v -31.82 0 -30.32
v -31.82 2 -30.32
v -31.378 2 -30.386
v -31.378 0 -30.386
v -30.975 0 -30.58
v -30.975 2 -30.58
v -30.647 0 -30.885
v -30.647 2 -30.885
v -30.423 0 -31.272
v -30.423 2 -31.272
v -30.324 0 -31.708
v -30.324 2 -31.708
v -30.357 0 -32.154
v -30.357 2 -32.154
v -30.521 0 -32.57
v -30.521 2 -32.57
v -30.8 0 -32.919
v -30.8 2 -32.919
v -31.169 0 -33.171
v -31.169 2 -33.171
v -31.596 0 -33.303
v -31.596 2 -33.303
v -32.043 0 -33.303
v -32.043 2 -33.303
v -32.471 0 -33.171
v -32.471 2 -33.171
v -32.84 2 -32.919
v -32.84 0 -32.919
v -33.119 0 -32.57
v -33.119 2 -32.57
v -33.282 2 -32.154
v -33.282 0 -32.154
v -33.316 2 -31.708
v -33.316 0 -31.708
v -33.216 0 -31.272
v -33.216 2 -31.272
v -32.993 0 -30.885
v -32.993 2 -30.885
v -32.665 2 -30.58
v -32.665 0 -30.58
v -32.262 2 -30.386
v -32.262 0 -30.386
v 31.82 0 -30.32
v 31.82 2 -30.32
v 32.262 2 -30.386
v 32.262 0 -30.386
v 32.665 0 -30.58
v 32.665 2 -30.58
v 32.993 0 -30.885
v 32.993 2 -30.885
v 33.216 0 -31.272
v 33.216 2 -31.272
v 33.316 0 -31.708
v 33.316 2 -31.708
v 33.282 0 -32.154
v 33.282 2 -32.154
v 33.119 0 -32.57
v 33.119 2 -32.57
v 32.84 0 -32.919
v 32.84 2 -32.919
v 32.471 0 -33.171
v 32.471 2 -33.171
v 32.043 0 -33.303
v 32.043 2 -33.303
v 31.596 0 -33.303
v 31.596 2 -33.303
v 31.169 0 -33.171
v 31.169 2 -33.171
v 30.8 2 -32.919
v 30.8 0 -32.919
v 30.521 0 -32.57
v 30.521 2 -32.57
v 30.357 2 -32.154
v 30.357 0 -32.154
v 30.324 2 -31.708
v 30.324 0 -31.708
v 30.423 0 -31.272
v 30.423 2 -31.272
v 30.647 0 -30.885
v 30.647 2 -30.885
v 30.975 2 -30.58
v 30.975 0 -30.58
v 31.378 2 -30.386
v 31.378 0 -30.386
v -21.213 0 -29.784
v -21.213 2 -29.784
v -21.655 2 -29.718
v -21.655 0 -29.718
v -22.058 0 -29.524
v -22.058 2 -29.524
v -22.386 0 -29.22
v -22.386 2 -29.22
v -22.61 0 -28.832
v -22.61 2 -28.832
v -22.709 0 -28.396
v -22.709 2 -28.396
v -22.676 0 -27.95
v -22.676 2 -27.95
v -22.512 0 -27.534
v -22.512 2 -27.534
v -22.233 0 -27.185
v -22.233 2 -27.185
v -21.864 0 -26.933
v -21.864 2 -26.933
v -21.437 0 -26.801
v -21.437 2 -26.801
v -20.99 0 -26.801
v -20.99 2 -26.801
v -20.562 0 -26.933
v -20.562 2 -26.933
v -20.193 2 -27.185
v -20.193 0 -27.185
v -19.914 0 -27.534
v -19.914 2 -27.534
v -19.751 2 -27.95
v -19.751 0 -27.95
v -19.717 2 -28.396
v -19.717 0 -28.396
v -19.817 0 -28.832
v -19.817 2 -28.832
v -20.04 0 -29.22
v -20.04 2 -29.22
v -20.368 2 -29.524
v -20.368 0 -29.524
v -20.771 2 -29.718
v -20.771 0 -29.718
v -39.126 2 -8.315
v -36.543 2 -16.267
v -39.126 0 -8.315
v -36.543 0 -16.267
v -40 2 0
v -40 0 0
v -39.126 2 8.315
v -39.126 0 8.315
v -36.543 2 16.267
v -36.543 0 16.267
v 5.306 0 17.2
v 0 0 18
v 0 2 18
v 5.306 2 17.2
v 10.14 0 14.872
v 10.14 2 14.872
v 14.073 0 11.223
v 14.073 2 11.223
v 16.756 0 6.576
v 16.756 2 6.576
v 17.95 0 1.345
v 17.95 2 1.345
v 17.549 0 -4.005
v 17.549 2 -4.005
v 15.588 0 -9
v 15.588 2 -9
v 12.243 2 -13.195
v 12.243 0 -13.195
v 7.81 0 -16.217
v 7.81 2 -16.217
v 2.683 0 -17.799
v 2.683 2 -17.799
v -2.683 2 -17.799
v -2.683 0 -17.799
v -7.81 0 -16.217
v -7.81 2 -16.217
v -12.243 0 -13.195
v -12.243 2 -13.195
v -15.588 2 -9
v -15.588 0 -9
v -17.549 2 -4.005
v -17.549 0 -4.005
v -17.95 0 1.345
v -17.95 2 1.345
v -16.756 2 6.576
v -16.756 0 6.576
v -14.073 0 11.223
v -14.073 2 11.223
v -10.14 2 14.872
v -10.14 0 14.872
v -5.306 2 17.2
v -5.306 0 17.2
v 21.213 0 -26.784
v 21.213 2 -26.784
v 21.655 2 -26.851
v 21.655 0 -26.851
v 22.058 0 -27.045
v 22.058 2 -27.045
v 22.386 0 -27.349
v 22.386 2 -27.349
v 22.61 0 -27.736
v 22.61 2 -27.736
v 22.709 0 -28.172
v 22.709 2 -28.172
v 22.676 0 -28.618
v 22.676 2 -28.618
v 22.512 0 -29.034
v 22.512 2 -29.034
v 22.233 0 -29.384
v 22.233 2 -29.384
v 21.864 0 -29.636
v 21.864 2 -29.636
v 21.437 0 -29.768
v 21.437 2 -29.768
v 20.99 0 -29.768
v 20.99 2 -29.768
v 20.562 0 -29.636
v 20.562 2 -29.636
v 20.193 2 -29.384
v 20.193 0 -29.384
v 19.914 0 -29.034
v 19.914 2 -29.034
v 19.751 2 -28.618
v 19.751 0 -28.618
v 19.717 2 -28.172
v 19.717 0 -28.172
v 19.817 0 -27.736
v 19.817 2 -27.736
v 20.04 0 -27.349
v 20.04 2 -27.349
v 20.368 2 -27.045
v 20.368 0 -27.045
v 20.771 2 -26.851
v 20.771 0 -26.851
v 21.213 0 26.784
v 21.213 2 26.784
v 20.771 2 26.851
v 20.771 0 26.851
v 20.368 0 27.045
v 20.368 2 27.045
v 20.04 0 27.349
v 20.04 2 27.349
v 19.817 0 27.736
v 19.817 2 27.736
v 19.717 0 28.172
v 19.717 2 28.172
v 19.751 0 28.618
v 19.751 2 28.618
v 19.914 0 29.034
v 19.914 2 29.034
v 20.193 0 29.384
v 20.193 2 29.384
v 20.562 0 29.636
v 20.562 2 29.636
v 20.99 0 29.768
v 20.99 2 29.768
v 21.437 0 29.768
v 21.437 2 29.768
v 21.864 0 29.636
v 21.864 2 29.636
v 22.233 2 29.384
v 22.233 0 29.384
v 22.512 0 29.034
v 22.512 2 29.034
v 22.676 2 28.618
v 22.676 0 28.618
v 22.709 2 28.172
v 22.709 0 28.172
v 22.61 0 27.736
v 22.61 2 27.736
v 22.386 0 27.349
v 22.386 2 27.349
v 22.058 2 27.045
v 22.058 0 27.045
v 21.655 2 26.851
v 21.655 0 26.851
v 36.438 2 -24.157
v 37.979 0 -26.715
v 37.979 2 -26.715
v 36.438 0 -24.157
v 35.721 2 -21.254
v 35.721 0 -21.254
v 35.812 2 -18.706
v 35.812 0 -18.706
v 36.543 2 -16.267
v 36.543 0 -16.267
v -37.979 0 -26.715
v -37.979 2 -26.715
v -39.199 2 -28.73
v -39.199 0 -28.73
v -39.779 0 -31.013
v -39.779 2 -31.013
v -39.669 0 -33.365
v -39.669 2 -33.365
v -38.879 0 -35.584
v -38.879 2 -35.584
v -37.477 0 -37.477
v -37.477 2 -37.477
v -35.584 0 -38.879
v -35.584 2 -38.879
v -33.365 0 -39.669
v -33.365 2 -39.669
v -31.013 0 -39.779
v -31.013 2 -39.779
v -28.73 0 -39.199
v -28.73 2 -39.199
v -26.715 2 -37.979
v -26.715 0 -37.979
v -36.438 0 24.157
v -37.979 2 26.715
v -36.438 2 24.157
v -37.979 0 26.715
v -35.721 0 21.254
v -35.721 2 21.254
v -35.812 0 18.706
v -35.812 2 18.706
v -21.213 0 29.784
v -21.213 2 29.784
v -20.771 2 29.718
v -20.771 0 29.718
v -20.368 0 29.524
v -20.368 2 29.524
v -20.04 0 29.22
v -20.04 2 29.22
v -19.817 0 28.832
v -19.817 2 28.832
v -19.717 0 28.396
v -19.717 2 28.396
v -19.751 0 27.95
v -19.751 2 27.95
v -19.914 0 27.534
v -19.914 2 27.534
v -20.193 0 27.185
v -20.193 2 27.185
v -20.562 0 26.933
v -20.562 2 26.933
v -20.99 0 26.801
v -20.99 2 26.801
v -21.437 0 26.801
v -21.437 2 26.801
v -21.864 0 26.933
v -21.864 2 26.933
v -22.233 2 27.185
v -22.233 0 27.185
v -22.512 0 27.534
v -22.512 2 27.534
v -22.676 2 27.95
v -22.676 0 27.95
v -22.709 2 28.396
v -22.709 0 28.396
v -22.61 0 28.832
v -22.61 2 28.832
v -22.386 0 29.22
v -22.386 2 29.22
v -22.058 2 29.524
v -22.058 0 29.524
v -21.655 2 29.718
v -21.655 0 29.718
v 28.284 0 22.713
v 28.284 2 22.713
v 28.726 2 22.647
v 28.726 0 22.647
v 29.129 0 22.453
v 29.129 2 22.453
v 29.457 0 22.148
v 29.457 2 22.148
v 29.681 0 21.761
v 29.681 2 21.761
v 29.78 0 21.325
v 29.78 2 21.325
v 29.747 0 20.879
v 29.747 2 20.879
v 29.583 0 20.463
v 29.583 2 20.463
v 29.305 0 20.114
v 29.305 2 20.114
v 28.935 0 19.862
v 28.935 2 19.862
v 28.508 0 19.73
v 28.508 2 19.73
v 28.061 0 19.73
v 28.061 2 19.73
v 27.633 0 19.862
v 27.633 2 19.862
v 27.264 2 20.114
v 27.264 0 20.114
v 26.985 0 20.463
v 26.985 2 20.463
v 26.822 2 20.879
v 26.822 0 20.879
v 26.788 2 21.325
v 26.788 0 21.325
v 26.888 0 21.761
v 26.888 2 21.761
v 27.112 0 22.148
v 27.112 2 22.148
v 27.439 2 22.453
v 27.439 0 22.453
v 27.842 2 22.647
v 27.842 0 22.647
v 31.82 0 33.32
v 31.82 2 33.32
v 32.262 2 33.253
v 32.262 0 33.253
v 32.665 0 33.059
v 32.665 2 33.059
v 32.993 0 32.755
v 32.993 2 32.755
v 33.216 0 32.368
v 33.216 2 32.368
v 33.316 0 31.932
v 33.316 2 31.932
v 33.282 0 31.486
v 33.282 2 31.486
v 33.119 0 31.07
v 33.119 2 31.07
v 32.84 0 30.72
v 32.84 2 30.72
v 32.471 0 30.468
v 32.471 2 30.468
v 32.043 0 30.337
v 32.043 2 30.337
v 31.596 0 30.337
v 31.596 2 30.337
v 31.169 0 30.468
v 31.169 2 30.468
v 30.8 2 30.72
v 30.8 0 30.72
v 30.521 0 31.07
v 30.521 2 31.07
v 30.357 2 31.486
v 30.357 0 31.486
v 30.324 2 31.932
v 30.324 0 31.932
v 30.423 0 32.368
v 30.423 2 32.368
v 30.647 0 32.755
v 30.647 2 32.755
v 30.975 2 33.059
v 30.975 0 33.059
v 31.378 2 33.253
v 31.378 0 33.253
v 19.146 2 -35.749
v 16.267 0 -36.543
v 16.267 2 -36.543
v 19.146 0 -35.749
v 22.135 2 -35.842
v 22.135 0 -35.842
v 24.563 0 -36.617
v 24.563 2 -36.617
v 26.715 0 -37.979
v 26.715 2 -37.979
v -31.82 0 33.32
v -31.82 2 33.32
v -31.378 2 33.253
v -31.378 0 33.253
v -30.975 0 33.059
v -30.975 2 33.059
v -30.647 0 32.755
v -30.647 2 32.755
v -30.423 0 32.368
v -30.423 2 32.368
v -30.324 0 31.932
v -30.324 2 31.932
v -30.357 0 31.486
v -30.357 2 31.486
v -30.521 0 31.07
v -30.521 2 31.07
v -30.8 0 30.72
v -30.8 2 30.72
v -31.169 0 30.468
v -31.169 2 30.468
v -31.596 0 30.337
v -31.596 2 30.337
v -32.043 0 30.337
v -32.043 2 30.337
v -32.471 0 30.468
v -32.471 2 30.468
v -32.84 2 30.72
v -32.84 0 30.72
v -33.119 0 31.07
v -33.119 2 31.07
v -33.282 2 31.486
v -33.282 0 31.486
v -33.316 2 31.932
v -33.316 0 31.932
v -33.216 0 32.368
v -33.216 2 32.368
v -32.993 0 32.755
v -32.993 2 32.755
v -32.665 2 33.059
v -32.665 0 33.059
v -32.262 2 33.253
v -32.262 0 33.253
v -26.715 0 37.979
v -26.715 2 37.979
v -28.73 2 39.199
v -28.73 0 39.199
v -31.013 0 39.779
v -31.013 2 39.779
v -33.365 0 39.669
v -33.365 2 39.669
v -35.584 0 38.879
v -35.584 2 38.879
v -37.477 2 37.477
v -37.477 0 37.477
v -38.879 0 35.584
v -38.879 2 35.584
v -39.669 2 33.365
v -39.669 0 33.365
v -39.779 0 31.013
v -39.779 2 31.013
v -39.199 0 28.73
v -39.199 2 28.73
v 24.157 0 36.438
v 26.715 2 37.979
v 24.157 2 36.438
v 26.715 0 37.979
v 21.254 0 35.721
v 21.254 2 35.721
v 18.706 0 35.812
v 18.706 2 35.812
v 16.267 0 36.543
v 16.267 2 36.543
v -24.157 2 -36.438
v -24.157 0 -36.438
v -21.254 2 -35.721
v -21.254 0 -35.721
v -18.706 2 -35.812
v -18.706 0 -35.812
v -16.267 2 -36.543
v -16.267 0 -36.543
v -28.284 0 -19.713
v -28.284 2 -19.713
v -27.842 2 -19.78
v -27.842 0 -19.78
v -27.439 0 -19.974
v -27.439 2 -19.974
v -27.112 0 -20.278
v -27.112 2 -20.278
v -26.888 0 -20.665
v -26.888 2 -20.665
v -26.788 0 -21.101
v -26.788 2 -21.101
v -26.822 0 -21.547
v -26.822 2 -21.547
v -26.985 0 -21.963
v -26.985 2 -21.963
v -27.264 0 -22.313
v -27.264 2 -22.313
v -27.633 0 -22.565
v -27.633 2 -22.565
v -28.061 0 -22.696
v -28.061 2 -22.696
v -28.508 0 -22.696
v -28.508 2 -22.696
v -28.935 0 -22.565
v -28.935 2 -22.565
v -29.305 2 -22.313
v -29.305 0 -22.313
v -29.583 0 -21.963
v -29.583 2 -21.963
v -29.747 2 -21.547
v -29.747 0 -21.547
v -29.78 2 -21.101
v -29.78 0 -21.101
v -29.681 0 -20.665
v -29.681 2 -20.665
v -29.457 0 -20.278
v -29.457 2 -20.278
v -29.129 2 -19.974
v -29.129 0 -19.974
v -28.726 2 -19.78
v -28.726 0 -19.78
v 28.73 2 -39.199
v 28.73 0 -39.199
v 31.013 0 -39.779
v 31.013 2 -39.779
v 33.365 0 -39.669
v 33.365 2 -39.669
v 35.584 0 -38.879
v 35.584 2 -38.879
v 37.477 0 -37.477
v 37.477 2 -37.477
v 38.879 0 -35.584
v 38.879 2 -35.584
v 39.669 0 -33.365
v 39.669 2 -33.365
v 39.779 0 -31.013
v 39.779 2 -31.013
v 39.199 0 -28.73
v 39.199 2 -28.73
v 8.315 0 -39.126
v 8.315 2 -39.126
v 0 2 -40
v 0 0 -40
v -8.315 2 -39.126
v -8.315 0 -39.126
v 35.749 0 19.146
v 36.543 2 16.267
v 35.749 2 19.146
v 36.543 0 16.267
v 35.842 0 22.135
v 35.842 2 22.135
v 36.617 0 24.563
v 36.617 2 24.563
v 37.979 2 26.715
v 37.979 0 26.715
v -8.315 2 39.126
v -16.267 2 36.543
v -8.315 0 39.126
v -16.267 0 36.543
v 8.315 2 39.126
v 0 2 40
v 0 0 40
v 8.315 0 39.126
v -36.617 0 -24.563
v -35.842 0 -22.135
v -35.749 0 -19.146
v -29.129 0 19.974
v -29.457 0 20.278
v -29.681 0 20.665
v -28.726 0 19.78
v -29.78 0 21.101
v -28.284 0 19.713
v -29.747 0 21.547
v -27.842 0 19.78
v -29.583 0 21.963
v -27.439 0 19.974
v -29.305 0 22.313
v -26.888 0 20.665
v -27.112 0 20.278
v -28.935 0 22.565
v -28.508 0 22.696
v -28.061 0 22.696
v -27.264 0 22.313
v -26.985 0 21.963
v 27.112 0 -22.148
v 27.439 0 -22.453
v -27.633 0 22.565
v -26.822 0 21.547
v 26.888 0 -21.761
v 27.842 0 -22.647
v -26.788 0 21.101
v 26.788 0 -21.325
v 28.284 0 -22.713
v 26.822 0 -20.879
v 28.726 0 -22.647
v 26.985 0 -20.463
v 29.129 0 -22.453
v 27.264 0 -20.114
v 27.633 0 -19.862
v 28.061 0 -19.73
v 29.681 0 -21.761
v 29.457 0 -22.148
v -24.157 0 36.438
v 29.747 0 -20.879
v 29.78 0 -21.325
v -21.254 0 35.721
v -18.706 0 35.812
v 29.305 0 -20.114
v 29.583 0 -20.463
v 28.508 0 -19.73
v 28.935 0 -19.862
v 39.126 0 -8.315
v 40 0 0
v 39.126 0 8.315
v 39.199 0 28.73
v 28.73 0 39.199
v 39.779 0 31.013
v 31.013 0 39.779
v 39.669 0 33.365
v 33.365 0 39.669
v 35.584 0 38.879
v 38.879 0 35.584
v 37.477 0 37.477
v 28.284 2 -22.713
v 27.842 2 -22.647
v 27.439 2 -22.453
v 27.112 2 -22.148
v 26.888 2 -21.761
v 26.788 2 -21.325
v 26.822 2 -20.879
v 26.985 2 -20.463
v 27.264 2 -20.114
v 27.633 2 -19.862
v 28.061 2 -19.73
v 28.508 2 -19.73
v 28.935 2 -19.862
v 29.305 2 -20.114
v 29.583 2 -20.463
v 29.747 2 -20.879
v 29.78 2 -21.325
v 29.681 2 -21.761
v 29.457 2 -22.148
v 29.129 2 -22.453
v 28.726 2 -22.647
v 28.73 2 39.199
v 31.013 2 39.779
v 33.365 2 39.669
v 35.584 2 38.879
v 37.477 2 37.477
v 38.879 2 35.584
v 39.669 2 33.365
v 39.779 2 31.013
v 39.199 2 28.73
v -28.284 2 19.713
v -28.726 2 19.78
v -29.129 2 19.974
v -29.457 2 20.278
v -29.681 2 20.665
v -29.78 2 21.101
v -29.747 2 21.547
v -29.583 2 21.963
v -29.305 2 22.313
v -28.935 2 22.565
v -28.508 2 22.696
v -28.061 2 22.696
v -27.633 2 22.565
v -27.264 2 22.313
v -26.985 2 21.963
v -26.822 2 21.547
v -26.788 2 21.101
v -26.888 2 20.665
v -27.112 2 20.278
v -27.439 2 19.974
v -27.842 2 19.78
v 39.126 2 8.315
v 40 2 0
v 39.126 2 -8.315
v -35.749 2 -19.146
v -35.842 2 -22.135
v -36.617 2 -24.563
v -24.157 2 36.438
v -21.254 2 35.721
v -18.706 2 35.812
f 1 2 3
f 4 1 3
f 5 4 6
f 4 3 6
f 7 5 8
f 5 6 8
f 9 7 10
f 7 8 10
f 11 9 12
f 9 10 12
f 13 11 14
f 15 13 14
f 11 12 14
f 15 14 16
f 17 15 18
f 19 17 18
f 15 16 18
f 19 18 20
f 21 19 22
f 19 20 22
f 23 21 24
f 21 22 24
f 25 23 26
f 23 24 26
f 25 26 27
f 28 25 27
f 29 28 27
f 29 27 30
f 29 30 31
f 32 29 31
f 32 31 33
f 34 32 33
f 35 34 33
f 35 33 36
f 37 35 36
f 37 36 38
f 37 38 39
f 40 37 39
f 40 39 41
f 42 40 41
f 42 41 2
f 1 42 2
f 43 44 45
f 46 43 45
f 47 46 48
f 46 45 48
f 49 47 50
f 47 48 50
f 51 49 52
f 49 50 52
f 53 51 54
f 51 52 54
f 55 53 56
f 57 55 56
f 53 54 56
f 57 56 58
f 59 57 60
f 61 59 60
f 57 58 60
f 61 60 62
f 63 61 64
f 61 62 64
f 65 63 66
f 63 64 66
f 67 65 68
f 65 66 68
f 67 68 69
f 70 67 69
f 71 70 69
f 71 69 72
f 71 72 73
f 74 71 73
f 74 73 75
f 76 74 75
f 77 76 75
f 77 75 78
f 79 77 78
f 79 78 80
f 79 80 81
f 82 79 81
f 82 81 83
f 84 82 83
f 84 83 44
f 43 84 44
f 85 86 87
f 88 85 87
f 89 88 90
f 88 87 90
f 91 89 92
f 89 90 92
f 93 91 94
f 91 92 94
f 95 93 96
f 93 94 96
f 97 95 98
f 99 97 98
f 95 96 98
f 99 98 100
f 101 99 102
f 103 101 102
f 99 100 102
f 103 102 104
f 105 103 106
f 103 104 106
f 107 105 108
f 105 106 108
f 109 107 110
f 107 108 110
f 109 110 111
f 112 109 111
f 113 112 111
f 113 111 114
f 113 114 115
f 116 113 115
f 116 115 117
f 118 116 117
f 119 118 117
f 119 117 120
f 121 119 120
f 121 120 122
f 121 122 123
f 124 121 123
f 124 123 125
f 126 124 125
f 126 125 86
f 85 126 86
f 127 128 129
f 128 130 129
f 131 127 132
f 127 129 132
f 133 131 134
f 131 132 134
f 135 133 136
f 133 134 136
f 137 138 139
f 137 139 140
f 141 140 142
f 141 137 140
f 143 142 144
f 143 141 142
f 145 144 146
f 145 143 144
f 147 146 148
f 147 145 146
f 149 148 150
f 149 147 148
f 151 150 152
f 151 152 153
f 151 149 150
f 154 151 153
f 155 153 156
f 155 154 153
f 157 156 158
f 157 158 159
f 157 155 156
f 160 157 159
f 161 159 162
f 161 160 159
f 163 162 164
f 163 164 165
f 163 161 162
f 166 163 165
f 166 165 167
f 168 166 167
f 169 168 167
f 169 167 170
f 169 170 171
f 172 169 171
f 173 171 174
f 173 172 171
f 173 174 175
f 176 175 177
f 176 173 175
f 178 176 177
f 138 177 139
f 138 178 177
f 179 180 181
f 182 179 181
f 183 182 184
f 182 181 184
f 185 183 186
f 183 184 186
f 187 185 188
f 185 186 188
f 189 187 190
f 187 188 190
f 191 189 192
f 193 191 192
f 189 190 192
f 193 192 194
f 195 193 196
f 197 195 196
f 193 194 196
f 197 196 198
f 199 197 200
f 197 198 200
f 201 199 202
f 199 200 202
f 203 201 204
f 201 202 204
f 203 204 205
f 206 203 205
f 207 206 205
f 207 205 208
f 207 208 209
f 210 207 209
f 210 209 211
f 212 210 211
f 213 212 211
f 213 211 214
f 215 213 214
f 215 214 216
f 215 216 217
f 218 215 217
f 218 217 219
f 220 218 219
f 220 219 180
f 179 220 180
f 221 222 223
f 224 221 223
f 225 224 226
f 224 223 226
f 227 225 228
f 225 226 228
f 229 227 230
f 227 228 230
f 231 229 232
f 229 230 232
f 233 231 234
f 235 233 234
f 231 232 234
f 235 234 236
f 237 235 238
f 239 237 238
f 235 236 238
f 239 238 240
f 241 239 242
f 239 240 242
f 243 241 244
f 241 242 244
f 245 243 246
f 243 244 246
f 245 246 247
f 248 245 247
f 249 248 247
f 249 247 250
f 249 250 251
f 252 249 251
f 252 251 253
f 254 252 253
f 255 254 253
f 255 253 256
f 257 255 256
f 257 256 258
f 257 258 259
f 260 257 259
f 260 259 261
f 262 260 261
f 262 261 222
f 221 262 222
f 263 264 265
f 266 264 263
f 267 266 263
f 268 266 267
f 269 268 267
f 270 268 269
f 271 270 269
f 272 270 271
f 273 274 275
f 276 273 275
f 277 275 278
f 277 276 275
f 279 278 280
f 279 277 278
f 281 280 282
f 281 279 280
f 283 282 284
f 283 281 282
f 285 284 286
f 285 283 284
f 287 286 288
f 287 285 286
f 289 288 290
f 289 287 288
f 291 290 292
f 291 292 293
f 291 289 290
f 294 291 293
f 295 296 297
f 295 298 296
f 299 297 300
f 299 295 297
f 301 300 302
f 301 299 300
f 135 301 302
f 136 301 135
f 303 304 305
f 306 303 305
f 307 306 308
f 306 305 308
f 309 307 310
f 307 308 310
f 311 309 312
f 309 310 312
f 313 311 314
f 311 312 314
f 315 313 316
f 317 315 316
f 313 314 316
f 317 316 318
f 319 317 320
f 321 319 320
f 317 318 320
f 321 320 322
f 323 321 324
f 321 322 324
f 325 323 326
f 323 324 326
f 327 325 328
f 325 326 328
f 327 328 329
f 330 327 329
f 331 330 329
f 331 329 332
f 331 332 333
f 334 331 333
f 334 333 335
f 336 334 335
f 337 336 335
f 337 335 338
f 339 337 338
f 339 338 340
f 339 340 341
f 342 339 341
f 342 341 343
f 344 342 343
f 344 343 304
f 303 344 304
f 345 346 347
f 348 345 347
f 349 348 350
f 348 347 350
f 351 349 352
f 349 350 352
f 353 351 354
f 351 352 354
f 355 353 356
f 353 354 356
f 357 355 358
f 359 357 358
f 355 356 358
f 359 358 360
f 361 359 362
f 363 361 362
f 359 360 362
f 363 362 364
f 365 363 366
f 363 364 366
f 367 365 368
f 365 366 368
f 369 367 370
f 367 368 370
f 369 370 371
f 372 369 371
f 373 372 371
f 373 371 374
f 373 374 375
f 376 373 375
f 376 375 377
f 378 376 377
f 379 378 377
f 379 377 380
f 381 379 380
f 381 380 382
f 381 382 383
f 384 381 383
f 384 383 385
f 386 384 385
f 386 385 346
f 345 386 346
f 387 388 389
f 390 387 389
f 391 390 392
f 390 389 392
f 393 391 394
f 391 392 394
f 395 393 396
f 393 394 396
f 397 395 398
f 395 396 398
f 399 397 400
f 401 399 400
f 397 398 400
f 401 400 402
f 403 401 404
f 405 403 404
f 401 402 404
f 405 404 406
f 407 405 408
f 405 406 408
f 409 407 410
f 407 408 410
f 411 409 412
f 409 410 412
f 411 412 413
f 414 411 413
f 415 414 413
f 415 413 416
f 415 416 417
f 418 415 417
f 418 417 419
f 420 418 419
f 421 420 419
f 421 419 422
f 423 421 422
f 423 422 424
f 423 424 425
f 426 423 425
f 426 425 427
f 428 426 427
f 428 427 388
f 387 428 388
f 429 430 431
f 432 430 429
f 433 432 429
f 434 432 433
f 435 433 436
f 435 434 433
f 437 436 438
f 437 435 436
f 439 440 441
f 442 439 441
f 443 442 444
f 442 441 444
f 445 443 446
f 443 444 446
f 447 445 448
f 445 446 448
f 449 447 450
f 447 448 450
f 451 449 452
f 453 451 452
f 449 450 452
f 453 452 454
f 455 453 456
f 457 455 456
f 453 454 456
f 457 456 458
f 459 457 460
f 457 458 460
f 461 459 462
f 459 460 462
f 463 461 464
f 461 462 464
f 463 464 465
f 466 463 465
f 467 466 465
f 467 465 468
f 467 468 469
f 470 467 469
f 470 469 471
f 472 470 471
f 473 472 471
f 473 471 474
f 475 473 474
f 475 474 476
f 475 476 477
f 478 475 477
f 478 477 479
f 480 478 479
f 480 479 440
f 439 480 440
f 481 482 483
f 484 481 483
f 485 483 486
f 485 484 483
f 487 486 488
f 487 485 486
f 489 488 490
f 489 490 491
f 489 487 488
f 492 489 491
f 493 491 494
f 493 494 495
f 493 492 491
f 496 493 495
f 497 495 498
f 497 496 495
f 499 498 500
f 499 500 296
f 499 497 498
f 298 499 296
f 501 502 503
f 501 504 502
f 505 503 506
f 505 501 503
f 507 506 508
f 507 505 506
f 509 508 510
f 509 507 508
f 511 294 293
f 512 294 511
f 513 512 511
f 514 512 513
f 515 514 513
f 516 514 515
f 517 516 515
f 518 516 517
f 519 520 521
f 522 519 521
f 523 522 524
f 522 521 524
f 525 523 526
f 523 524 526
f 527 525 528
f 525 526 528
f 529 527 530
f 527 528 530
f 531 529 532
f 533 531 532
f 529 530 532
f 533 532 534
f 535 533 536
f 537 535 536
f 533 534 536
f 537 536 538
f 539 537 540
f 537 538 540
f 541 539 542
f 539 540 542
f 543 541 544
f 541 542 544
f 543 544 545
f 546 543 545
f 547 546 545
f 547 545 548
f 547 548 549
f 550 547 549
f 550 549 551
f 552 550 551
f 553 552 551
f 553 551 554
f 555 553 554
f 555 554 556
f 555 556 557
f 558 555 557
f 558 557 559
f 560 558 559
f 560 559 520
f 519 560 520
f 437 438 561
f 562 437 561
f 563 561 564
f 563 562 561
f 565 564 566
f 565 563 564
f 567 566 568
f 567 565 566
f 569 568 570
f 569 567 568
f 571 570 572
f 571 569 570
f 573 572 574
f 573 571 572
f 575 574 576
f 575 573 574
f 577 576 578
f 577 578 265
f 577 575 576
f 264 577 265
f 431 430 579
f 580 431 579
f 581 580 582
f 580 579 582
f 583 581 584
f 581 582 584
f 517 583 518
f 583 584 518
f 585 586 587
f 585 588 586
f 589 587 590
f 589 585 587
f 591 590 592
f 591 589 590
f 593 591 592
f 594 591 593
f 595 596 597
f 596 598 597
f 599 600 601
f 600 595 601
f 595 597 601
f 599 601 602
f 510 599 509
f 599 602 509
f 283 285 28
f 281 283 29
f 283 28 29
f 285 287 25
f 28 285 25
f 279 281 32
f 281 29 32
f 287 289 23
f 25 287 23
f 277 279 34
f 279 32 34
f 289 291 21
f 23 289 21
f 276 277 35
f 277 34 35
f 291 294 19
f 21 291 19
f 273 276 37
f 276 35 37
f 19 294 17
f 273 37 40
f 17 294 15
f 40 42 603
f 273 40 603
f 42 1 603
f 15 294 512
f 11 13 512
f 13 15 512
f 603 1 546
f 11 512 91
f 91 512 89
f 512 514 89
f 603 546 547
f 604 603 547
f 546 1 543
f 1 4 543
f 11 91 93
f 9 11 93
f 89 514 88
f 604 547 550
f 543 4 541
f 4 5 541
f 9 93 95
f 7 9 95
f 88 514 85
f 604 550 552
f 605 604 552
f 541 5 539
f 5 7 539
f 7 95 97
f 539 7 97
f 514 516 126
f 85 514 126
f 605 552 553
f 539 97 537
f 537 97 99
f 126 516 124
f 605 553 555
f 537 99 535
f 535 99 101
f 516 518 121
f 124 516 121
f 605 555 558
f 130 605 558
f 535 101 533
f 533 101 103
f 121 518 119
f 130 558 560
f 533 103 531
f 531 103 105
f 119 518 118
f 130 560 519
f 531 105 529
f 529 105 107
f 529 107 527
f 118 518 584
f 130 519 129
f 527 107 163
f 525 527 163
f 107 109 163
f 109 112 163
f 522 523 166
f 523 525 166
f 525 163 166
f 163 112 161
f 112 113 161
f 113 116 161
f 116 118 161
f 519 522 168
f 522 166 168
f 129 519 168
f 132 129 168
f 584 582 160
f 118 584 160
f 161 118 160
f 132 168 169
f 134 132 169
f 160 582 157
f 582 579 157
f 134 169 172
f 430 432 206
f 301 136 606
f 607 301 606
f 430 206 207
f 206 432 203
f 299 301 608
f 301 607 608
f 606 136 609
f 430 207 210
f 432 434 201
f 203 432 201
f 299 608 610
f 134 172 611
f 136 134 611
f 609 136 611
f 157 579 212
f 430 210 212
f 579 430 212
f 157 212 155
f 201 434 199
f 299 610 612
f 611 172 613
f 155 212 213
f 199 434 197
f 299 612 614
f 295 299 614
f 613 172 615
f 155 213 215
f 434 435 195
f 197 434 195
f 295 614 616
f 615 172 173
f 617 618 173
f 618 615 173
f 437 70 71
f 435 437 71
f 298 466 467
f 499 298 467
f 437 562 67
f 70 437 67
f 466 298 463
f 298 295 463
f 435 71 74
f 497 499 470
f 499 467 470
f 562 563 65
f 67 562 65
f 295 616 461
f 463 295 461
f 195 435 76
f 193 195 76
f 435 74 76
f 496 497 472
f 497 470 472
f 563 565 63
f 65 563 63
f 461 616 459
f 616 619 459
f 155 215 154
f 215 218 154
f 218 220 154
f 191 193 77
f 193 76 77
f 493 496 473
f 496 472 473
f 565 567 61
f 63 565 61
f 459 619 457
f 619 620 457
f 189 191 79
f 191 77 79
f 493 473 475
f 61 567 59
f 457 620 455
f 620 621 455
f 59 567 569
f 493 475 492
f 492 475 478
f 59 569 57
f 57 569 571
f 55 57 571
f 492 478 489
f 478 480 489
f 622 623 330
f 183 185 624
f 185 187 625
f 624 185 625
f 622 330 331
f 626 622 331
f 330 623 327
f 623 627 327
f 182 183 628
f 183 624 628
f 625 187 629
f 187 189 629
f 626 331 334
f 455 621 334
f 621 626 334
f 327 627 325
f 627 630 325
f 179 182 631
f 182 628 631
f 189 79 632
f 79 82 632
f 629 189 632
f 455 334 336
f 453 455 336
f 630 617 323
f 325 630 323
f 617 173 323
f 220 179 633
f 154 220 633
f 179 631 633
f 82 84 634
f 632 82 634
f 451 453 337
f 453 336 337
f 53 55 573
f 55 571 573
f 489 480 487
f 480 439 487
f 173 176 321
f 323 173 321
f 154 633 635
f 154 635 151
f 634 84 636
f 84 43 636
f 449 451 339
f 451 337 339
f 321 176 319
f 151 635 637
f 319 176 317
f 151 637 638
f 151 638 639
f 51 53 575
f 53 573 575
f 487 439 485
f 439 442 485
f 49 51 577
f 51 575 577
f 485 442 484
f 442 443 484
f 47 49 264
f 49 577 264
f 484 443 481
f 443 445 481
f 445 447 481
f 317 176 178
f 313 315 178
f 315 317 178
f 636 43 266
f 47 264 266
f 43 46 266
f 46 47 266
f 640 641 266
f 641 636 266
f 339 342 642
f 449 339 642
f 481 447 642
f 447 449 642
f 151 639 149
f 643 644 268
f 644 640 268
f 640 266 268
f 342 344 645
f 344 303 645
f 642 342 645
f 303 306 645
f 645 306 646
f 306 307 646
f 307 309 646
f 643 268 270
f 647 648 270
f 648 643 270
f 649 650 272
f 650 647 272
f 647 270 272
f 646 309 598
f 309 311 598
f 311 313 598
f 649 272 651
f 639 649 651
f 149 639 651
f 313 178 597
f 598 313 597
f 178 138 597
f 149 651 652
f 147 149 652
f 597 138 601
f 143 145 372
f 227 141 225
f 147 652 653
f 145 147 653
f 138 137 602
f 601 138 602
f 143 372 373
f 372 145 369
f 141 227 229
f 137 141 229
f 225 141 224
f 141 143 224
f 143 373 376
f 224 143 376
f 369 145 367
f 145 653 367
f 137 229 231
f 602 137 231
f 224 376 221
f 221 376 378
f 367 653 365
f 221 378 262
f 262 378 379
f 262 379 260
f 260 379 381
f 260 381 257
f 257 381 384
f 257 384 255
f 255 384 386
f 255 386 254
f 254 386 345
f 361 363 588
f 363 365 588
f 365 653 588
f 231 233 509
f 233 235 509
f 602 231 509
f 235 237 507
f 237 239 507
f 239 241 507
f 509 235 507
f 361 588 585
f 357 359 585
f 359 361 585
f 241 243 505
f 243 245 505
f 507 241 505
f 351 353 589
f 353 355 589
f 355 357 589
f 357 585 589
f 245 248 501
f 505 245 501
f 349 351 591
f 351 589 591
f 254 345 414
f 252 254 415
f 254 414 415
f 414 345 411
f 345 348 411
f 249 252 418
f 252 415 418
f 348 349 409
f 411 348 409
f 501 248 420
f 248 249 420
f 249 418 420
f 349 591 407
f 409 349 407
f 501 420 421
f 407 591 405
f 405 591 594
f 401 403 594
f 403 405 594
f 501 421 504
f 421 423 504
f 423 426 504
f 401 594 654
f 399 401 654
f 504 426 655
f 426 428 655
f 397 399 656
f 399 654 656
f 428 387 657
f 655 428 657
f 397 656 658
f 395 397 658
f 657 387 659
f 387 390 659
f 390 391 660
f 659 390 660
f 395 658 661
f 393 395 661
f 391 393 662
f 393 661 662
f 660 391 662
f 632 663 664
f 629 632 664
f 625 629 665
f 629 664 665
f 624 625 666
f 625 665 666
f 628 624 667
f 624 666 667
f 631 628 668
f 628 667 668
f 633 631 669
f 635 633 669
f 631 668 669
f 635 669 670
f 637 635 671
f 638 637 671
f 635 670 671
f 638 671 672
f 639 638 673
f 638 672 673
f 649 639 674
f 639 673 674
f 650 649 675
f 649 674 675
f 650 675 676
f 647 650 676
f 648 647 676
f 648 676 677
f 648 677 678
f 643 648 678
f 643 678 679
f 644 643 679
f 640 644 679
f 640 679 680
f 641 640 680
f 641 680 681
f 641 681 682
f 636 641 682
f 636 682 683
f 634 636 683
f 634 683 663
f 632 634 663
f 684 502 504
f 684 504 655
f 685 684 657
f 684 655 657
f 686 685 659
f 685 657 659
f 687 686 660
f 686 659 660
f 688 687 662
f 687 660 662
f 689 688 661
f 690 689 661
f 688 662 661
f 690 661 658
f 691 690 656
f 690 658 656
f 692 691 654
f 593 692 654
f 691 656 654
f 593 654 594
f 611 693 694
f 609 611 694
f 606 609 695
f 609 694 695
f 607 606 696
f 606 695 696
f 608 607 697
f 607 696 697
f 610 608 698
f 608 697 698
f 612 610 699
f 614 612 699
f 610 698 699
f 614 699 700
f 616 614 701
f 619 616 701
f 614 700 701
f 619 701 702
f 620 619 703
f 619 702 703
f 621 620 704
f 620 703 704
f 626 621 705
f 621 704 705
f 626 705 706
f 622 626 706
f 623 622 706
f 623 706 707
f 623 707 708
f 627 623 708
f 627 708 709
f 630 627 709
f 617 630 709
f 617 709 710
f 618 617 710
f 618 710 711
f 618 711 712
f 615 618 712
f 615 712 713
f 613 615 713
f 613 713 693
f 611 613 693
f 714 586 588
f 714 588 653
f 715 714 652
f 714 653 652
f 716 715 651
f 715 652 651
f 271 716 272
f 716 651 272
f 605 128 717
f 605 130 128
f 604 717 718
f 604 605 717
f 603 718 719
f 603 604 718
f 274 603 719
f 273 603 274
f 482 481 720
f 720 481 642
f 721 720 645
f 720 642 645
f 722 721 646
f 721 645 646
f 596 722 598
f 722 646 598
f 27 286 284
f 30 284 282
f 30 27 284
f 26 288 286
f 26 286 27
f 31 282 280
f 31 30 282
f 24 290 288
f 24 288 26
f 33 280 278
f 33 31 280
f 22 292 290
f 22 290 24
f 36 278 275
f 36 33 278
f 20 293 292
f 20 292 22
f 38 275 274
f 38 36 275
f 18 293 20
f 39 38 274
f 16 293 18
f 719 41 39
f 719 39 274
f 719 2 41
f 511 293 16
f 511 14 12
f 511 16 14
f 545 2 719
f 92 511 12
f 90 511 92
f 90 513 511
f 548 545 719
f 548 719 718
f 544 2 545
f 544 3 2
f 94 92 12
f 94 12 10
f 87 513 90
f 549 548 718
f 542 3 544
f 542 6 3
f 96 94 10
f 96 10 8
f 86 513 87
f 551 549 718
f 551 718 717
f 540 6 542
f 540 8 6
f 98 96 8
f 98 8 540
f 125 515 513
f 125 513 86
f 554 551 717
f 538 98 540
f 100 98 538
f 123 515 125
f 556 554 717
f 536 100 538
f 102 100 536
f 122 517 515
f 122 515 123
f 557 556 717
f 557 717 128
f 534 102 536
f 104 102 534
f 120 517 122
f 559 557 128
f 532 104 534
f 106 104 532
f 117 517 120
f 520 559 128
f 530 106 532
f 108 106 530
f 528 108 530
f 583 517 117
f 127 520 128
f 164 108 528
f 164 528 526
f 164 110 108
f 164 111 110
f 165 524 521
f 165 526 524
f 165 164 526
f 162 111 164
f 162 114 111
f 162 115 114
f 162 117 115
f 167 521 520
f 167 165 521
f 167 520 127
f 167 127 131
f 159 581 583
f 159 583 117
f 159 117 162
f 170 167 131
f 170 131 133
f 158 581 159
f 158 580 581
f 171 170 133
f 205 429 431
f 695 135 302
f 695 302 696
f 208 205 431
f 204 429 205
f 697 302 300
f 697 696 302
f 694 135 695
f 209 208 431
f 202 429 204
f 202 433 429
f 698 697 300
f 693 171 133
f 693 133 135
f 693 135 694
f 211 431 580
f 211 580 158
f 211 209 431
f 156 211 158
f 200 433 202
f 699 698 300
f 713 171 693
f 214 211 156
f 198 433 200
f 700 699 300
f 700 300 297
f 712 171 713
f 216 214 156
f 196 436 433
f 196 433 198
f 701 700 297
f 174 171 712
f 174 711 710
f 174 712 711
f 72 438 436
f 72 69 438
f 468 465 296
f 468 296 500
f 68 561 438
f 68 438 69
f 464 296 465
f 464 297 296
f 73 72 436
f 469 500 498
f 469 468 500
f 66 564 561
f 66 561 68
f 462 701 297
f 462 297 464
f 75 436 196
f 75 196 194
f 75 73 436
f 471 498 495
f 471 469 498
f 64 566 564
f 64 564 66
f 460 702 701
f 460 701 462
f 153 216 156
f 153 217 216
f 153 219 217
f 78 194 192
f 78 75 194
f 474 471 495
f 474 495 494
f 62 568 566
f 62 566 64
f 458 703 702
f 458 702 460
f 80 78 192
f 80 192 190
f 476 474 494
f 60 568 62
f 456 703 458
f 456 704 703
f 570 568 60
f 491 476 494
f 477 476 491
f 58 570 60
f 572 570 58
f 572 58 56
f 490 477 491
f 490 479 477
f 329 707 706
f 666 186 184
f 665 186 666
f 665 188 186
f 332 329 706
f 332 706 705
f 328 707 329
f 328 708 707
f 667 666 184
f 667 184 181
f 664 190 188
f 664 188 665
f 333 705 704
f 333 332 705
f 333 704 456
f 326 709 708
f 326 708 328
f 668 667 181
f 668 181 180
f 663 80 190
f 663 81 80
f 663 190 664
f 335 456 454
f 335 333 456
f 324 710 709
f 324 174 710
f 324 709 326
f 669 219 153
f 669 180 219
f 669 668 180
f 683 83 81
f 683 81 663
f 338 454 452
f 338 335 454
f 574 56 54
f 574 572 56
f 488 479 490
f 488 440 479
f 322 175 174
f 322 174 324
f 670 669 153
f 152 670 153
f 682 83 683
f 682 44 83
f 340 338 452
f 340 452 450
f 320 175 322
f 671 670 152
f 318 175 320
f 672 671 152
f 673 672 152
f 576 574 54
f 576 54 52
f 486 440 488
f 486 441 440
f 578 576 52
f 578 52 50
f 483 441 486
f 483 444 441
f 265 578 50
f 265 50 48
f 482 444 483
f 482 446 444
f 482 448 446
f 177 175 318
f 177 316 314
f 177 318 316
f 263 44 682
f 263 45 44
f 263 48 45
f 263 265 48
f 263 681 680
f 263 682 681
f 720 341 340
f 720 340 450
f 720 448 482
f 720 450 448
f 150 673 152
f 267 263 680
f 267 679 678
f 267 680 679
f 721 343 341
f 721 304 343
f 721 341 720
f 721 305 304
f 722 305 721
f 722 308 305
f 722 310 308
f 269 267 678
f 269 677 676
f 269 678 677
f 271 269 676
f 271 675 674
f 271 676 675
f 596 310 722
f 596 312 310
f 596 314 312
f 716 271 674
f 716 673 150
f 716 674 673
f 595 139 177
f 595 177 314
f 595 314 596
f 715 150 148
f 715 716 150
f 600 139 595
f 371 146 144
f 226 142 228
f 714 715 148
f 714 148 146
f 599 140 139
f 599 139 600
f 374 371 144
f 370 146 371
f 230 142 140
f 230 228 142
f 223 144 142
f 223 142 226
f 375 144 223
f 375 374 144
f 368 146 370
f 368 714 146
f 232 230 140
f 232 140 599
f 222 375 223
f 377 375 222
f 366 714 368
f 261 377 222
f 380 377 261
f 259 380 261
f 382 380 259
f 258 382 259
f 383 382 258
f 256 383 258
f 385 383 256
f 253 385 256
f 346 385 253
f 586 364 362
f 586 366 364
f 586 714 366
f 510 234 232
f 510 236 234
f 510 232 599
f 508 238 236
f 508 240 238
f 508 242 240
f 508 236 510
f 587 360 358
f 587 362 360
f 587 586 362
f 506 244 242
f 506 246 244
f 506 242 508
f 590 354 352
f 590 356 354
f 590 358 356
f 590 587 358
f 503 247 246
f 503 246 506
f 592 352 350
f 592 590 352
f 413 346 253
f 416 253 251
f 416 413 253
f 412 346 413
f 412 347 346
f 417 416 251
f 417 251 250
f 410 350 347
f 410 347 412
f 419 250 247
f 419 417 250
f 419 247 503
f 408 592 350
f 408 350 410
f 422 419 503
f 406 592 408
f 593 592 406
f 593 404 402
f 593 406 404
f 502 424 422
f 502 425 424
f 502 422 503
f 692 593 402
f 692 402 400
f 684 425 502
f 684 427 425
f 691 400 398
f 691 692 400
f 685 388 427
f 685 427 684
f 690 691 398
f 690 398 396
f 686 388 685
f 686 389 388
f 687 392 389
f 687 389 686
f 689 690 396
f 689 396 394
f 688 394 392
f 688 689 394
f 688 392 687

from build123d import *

# Parameters (mm, degrees)
SKETCH_1_R          = 40
SKETCH_1_R_2        = 18
EXTRUDE_1_DEPTH     = 2
EXTRUDE_2_DEPTH     = 2
FILLET_1_R          = 10
SKETCH_2_R          = 1.5
CUT_EXTRUDE_1_DEPTH = 57.603886937


with BuildPart() as part:
    # 草图1 → 凸台-拉伸1 (new body)
    with BuildSketch(Plane(origin=(0, 0, 0), x_dir=(1, 0, 0), z_dir=(0, 1, 0))):
        with Locations(Location((0, 0, 0), (0, 0, 270))):
            Circle(SKETCH_1_R)
        with Locations(Location((0, 0, 0), (0, 0, 270))):
            Circle(SKETCH_1_R_2, mode=Mode.SUBTRACT)
    extrude(amount=EXTRUDE_1_DEPTH)

    # 草图4 → 凸台-拉伸2 (add)
    with BuildSketch(Plane.XZ):
        with BuildLine():
            Line((19.091883092, 30.405591591), (26.162950904, 37.476659403))
            ThreePointArc((26.162950904, 37.476659403), (37.476659403, 37.476659403), (37.476659403, 26.162950904))
            Line((37.476659403, 26.162950904), (30.405591591, 19.091883092))
            ThreePointArc((30.405591591, 19.091883092), (19.091883092, 19.091883092), (19.091883092, 30.405591591))
        make_face()
        with BuildLine():
            Line((19.091883092, -30.405591591), (26.162950904, -37.476659403))
            ThreePointArc((26.162950904, -37.476659403), (37.476659403, -37.476659403), (37.476659403, -26.162950904))
            Line((37.476659403, -26.162950904), (30.405591591, -19.091883092))
            ThreePointArc((30.405591591, -19.091883092), (19.091883092, -19.091883092), (19.091883092, -30.405591591))
        make_face()
        with BuildLine():
            Line((-30.405591591, -19.091883092), (-37.476659403, -26.162950904))
            ThreePointArc((-37.476659403, -26.162950904), (-37.476659403, -37.476659403), (-26.162950904, -37.476659403))
            Line((-26.162950904, -37.476659403), (-19.091883092, -30.405591591))
            ThreePointArc((-19.091883092, -30.405591591), (-19.091883092, -19.091883092), (-30.405591591, -19.091883092))
        make_face()
        with BuildLine():
            Line((-19.091883092, 30.405591591), (-26.162950904, 37.476659403))
            ThreePointArc((-26.162950904, 37.476659403), (-37.476659403, 37.476659403), (-37.476659403, 26.162950904))
            Line((-37.476659403, 26.162950904), (-30.405591591, 19.091883092))
            ThreePointArc((-30.405591591, 19.091883092), (-19.091883092, 19.091883092), (-19.091883092, 30.405591591))
        make_face()
    extrude(amount=-EXTRUDE_2_DEPTH)

    # 圆角1
    fillet_1_edges = [part.edges().sort_by_distance(p)[0] for p in [
        (-22.055958672, 1, -33.369667171),
        (-33.369667171, 1, -22.055958672),
        (-33.369667171, 1, 22.055958672),
        (-22.055958672, 1, 33.369667171),
        (22.055958672, 1, 33.369667171),
        (33.369667171, 1, 22.055958672),
        (33.369667171, 1, -22.055958672),
        (22.055958672, 1, -33.369667171),
    ]]
    fillet(fillet_1_edges, radius=FILLET_1_R)

    # 草图2 → 切除-拉伸1 (cut, through all)
    with BuildSketch(Plane(origin=(0, 2, 0), x_dir=(1, 0, 0), z_dir=(0, 1, 0))):
        with Locations(Location((-21.213203436, -28.284271247, 0), (0, 0, 270))):
            Circle(SKETCH_2_R)
        with Locations(Location((-31.819805153, -31.819805153, 0), (0, 0, 270))):
            Circle(SKETCH_2_R)
        with Locations(Location((-28.284271247, -21.213203436, 0), (0, 0, 90))):
            Circle(SKETCH_2_R)
        with Locations(Location((-31.819805153, 31.819805153, 0), (0, 0, 270))):
            Circle(SKETCH_2_R)
        with Locations(Location((-21.213203436, 28.284271247, 0), (0, 0, 90))):
            Circle(SKETCH_2_R)
        with Locations(Location((-28.284271247, 21.213203436, 0), (0, 0, 270))):
            Circle(SKETCH_2_R)
        with Locations(Location((31.819805153, 31.819805153, 0), (0, 0, 270))):
            Circle(SKETCH_2_R)
        with Locations(Location((28.284271247, 21.213203436, 0), (0, 0, 90))):
            Circle(SKETCH_2_R)
        with Locations(Location((21.213203436, 28.284271247, 0), (0, 0, 270))):
            Circle(SKETCH_2_R)
        with Locations(Location((31.819805153, -31.819805153, 0), (0, 0, 270))):
            Circle(SKETCH_2_R)
        with Locations(Location((21.213203436, -28.284271247, 0), (0, 0, 90))):
            Circle(SKETCH_2_R)
        with Locations(Location((28.284271247, -21.213203436, 0), (0, 0, 270))):
            Circle(SKETCH_2_R)
    extrude(amount=-CUT_EXTRUDE_1_DEPTH, mode=Mode.SUBTRACT)


solid = part.part
